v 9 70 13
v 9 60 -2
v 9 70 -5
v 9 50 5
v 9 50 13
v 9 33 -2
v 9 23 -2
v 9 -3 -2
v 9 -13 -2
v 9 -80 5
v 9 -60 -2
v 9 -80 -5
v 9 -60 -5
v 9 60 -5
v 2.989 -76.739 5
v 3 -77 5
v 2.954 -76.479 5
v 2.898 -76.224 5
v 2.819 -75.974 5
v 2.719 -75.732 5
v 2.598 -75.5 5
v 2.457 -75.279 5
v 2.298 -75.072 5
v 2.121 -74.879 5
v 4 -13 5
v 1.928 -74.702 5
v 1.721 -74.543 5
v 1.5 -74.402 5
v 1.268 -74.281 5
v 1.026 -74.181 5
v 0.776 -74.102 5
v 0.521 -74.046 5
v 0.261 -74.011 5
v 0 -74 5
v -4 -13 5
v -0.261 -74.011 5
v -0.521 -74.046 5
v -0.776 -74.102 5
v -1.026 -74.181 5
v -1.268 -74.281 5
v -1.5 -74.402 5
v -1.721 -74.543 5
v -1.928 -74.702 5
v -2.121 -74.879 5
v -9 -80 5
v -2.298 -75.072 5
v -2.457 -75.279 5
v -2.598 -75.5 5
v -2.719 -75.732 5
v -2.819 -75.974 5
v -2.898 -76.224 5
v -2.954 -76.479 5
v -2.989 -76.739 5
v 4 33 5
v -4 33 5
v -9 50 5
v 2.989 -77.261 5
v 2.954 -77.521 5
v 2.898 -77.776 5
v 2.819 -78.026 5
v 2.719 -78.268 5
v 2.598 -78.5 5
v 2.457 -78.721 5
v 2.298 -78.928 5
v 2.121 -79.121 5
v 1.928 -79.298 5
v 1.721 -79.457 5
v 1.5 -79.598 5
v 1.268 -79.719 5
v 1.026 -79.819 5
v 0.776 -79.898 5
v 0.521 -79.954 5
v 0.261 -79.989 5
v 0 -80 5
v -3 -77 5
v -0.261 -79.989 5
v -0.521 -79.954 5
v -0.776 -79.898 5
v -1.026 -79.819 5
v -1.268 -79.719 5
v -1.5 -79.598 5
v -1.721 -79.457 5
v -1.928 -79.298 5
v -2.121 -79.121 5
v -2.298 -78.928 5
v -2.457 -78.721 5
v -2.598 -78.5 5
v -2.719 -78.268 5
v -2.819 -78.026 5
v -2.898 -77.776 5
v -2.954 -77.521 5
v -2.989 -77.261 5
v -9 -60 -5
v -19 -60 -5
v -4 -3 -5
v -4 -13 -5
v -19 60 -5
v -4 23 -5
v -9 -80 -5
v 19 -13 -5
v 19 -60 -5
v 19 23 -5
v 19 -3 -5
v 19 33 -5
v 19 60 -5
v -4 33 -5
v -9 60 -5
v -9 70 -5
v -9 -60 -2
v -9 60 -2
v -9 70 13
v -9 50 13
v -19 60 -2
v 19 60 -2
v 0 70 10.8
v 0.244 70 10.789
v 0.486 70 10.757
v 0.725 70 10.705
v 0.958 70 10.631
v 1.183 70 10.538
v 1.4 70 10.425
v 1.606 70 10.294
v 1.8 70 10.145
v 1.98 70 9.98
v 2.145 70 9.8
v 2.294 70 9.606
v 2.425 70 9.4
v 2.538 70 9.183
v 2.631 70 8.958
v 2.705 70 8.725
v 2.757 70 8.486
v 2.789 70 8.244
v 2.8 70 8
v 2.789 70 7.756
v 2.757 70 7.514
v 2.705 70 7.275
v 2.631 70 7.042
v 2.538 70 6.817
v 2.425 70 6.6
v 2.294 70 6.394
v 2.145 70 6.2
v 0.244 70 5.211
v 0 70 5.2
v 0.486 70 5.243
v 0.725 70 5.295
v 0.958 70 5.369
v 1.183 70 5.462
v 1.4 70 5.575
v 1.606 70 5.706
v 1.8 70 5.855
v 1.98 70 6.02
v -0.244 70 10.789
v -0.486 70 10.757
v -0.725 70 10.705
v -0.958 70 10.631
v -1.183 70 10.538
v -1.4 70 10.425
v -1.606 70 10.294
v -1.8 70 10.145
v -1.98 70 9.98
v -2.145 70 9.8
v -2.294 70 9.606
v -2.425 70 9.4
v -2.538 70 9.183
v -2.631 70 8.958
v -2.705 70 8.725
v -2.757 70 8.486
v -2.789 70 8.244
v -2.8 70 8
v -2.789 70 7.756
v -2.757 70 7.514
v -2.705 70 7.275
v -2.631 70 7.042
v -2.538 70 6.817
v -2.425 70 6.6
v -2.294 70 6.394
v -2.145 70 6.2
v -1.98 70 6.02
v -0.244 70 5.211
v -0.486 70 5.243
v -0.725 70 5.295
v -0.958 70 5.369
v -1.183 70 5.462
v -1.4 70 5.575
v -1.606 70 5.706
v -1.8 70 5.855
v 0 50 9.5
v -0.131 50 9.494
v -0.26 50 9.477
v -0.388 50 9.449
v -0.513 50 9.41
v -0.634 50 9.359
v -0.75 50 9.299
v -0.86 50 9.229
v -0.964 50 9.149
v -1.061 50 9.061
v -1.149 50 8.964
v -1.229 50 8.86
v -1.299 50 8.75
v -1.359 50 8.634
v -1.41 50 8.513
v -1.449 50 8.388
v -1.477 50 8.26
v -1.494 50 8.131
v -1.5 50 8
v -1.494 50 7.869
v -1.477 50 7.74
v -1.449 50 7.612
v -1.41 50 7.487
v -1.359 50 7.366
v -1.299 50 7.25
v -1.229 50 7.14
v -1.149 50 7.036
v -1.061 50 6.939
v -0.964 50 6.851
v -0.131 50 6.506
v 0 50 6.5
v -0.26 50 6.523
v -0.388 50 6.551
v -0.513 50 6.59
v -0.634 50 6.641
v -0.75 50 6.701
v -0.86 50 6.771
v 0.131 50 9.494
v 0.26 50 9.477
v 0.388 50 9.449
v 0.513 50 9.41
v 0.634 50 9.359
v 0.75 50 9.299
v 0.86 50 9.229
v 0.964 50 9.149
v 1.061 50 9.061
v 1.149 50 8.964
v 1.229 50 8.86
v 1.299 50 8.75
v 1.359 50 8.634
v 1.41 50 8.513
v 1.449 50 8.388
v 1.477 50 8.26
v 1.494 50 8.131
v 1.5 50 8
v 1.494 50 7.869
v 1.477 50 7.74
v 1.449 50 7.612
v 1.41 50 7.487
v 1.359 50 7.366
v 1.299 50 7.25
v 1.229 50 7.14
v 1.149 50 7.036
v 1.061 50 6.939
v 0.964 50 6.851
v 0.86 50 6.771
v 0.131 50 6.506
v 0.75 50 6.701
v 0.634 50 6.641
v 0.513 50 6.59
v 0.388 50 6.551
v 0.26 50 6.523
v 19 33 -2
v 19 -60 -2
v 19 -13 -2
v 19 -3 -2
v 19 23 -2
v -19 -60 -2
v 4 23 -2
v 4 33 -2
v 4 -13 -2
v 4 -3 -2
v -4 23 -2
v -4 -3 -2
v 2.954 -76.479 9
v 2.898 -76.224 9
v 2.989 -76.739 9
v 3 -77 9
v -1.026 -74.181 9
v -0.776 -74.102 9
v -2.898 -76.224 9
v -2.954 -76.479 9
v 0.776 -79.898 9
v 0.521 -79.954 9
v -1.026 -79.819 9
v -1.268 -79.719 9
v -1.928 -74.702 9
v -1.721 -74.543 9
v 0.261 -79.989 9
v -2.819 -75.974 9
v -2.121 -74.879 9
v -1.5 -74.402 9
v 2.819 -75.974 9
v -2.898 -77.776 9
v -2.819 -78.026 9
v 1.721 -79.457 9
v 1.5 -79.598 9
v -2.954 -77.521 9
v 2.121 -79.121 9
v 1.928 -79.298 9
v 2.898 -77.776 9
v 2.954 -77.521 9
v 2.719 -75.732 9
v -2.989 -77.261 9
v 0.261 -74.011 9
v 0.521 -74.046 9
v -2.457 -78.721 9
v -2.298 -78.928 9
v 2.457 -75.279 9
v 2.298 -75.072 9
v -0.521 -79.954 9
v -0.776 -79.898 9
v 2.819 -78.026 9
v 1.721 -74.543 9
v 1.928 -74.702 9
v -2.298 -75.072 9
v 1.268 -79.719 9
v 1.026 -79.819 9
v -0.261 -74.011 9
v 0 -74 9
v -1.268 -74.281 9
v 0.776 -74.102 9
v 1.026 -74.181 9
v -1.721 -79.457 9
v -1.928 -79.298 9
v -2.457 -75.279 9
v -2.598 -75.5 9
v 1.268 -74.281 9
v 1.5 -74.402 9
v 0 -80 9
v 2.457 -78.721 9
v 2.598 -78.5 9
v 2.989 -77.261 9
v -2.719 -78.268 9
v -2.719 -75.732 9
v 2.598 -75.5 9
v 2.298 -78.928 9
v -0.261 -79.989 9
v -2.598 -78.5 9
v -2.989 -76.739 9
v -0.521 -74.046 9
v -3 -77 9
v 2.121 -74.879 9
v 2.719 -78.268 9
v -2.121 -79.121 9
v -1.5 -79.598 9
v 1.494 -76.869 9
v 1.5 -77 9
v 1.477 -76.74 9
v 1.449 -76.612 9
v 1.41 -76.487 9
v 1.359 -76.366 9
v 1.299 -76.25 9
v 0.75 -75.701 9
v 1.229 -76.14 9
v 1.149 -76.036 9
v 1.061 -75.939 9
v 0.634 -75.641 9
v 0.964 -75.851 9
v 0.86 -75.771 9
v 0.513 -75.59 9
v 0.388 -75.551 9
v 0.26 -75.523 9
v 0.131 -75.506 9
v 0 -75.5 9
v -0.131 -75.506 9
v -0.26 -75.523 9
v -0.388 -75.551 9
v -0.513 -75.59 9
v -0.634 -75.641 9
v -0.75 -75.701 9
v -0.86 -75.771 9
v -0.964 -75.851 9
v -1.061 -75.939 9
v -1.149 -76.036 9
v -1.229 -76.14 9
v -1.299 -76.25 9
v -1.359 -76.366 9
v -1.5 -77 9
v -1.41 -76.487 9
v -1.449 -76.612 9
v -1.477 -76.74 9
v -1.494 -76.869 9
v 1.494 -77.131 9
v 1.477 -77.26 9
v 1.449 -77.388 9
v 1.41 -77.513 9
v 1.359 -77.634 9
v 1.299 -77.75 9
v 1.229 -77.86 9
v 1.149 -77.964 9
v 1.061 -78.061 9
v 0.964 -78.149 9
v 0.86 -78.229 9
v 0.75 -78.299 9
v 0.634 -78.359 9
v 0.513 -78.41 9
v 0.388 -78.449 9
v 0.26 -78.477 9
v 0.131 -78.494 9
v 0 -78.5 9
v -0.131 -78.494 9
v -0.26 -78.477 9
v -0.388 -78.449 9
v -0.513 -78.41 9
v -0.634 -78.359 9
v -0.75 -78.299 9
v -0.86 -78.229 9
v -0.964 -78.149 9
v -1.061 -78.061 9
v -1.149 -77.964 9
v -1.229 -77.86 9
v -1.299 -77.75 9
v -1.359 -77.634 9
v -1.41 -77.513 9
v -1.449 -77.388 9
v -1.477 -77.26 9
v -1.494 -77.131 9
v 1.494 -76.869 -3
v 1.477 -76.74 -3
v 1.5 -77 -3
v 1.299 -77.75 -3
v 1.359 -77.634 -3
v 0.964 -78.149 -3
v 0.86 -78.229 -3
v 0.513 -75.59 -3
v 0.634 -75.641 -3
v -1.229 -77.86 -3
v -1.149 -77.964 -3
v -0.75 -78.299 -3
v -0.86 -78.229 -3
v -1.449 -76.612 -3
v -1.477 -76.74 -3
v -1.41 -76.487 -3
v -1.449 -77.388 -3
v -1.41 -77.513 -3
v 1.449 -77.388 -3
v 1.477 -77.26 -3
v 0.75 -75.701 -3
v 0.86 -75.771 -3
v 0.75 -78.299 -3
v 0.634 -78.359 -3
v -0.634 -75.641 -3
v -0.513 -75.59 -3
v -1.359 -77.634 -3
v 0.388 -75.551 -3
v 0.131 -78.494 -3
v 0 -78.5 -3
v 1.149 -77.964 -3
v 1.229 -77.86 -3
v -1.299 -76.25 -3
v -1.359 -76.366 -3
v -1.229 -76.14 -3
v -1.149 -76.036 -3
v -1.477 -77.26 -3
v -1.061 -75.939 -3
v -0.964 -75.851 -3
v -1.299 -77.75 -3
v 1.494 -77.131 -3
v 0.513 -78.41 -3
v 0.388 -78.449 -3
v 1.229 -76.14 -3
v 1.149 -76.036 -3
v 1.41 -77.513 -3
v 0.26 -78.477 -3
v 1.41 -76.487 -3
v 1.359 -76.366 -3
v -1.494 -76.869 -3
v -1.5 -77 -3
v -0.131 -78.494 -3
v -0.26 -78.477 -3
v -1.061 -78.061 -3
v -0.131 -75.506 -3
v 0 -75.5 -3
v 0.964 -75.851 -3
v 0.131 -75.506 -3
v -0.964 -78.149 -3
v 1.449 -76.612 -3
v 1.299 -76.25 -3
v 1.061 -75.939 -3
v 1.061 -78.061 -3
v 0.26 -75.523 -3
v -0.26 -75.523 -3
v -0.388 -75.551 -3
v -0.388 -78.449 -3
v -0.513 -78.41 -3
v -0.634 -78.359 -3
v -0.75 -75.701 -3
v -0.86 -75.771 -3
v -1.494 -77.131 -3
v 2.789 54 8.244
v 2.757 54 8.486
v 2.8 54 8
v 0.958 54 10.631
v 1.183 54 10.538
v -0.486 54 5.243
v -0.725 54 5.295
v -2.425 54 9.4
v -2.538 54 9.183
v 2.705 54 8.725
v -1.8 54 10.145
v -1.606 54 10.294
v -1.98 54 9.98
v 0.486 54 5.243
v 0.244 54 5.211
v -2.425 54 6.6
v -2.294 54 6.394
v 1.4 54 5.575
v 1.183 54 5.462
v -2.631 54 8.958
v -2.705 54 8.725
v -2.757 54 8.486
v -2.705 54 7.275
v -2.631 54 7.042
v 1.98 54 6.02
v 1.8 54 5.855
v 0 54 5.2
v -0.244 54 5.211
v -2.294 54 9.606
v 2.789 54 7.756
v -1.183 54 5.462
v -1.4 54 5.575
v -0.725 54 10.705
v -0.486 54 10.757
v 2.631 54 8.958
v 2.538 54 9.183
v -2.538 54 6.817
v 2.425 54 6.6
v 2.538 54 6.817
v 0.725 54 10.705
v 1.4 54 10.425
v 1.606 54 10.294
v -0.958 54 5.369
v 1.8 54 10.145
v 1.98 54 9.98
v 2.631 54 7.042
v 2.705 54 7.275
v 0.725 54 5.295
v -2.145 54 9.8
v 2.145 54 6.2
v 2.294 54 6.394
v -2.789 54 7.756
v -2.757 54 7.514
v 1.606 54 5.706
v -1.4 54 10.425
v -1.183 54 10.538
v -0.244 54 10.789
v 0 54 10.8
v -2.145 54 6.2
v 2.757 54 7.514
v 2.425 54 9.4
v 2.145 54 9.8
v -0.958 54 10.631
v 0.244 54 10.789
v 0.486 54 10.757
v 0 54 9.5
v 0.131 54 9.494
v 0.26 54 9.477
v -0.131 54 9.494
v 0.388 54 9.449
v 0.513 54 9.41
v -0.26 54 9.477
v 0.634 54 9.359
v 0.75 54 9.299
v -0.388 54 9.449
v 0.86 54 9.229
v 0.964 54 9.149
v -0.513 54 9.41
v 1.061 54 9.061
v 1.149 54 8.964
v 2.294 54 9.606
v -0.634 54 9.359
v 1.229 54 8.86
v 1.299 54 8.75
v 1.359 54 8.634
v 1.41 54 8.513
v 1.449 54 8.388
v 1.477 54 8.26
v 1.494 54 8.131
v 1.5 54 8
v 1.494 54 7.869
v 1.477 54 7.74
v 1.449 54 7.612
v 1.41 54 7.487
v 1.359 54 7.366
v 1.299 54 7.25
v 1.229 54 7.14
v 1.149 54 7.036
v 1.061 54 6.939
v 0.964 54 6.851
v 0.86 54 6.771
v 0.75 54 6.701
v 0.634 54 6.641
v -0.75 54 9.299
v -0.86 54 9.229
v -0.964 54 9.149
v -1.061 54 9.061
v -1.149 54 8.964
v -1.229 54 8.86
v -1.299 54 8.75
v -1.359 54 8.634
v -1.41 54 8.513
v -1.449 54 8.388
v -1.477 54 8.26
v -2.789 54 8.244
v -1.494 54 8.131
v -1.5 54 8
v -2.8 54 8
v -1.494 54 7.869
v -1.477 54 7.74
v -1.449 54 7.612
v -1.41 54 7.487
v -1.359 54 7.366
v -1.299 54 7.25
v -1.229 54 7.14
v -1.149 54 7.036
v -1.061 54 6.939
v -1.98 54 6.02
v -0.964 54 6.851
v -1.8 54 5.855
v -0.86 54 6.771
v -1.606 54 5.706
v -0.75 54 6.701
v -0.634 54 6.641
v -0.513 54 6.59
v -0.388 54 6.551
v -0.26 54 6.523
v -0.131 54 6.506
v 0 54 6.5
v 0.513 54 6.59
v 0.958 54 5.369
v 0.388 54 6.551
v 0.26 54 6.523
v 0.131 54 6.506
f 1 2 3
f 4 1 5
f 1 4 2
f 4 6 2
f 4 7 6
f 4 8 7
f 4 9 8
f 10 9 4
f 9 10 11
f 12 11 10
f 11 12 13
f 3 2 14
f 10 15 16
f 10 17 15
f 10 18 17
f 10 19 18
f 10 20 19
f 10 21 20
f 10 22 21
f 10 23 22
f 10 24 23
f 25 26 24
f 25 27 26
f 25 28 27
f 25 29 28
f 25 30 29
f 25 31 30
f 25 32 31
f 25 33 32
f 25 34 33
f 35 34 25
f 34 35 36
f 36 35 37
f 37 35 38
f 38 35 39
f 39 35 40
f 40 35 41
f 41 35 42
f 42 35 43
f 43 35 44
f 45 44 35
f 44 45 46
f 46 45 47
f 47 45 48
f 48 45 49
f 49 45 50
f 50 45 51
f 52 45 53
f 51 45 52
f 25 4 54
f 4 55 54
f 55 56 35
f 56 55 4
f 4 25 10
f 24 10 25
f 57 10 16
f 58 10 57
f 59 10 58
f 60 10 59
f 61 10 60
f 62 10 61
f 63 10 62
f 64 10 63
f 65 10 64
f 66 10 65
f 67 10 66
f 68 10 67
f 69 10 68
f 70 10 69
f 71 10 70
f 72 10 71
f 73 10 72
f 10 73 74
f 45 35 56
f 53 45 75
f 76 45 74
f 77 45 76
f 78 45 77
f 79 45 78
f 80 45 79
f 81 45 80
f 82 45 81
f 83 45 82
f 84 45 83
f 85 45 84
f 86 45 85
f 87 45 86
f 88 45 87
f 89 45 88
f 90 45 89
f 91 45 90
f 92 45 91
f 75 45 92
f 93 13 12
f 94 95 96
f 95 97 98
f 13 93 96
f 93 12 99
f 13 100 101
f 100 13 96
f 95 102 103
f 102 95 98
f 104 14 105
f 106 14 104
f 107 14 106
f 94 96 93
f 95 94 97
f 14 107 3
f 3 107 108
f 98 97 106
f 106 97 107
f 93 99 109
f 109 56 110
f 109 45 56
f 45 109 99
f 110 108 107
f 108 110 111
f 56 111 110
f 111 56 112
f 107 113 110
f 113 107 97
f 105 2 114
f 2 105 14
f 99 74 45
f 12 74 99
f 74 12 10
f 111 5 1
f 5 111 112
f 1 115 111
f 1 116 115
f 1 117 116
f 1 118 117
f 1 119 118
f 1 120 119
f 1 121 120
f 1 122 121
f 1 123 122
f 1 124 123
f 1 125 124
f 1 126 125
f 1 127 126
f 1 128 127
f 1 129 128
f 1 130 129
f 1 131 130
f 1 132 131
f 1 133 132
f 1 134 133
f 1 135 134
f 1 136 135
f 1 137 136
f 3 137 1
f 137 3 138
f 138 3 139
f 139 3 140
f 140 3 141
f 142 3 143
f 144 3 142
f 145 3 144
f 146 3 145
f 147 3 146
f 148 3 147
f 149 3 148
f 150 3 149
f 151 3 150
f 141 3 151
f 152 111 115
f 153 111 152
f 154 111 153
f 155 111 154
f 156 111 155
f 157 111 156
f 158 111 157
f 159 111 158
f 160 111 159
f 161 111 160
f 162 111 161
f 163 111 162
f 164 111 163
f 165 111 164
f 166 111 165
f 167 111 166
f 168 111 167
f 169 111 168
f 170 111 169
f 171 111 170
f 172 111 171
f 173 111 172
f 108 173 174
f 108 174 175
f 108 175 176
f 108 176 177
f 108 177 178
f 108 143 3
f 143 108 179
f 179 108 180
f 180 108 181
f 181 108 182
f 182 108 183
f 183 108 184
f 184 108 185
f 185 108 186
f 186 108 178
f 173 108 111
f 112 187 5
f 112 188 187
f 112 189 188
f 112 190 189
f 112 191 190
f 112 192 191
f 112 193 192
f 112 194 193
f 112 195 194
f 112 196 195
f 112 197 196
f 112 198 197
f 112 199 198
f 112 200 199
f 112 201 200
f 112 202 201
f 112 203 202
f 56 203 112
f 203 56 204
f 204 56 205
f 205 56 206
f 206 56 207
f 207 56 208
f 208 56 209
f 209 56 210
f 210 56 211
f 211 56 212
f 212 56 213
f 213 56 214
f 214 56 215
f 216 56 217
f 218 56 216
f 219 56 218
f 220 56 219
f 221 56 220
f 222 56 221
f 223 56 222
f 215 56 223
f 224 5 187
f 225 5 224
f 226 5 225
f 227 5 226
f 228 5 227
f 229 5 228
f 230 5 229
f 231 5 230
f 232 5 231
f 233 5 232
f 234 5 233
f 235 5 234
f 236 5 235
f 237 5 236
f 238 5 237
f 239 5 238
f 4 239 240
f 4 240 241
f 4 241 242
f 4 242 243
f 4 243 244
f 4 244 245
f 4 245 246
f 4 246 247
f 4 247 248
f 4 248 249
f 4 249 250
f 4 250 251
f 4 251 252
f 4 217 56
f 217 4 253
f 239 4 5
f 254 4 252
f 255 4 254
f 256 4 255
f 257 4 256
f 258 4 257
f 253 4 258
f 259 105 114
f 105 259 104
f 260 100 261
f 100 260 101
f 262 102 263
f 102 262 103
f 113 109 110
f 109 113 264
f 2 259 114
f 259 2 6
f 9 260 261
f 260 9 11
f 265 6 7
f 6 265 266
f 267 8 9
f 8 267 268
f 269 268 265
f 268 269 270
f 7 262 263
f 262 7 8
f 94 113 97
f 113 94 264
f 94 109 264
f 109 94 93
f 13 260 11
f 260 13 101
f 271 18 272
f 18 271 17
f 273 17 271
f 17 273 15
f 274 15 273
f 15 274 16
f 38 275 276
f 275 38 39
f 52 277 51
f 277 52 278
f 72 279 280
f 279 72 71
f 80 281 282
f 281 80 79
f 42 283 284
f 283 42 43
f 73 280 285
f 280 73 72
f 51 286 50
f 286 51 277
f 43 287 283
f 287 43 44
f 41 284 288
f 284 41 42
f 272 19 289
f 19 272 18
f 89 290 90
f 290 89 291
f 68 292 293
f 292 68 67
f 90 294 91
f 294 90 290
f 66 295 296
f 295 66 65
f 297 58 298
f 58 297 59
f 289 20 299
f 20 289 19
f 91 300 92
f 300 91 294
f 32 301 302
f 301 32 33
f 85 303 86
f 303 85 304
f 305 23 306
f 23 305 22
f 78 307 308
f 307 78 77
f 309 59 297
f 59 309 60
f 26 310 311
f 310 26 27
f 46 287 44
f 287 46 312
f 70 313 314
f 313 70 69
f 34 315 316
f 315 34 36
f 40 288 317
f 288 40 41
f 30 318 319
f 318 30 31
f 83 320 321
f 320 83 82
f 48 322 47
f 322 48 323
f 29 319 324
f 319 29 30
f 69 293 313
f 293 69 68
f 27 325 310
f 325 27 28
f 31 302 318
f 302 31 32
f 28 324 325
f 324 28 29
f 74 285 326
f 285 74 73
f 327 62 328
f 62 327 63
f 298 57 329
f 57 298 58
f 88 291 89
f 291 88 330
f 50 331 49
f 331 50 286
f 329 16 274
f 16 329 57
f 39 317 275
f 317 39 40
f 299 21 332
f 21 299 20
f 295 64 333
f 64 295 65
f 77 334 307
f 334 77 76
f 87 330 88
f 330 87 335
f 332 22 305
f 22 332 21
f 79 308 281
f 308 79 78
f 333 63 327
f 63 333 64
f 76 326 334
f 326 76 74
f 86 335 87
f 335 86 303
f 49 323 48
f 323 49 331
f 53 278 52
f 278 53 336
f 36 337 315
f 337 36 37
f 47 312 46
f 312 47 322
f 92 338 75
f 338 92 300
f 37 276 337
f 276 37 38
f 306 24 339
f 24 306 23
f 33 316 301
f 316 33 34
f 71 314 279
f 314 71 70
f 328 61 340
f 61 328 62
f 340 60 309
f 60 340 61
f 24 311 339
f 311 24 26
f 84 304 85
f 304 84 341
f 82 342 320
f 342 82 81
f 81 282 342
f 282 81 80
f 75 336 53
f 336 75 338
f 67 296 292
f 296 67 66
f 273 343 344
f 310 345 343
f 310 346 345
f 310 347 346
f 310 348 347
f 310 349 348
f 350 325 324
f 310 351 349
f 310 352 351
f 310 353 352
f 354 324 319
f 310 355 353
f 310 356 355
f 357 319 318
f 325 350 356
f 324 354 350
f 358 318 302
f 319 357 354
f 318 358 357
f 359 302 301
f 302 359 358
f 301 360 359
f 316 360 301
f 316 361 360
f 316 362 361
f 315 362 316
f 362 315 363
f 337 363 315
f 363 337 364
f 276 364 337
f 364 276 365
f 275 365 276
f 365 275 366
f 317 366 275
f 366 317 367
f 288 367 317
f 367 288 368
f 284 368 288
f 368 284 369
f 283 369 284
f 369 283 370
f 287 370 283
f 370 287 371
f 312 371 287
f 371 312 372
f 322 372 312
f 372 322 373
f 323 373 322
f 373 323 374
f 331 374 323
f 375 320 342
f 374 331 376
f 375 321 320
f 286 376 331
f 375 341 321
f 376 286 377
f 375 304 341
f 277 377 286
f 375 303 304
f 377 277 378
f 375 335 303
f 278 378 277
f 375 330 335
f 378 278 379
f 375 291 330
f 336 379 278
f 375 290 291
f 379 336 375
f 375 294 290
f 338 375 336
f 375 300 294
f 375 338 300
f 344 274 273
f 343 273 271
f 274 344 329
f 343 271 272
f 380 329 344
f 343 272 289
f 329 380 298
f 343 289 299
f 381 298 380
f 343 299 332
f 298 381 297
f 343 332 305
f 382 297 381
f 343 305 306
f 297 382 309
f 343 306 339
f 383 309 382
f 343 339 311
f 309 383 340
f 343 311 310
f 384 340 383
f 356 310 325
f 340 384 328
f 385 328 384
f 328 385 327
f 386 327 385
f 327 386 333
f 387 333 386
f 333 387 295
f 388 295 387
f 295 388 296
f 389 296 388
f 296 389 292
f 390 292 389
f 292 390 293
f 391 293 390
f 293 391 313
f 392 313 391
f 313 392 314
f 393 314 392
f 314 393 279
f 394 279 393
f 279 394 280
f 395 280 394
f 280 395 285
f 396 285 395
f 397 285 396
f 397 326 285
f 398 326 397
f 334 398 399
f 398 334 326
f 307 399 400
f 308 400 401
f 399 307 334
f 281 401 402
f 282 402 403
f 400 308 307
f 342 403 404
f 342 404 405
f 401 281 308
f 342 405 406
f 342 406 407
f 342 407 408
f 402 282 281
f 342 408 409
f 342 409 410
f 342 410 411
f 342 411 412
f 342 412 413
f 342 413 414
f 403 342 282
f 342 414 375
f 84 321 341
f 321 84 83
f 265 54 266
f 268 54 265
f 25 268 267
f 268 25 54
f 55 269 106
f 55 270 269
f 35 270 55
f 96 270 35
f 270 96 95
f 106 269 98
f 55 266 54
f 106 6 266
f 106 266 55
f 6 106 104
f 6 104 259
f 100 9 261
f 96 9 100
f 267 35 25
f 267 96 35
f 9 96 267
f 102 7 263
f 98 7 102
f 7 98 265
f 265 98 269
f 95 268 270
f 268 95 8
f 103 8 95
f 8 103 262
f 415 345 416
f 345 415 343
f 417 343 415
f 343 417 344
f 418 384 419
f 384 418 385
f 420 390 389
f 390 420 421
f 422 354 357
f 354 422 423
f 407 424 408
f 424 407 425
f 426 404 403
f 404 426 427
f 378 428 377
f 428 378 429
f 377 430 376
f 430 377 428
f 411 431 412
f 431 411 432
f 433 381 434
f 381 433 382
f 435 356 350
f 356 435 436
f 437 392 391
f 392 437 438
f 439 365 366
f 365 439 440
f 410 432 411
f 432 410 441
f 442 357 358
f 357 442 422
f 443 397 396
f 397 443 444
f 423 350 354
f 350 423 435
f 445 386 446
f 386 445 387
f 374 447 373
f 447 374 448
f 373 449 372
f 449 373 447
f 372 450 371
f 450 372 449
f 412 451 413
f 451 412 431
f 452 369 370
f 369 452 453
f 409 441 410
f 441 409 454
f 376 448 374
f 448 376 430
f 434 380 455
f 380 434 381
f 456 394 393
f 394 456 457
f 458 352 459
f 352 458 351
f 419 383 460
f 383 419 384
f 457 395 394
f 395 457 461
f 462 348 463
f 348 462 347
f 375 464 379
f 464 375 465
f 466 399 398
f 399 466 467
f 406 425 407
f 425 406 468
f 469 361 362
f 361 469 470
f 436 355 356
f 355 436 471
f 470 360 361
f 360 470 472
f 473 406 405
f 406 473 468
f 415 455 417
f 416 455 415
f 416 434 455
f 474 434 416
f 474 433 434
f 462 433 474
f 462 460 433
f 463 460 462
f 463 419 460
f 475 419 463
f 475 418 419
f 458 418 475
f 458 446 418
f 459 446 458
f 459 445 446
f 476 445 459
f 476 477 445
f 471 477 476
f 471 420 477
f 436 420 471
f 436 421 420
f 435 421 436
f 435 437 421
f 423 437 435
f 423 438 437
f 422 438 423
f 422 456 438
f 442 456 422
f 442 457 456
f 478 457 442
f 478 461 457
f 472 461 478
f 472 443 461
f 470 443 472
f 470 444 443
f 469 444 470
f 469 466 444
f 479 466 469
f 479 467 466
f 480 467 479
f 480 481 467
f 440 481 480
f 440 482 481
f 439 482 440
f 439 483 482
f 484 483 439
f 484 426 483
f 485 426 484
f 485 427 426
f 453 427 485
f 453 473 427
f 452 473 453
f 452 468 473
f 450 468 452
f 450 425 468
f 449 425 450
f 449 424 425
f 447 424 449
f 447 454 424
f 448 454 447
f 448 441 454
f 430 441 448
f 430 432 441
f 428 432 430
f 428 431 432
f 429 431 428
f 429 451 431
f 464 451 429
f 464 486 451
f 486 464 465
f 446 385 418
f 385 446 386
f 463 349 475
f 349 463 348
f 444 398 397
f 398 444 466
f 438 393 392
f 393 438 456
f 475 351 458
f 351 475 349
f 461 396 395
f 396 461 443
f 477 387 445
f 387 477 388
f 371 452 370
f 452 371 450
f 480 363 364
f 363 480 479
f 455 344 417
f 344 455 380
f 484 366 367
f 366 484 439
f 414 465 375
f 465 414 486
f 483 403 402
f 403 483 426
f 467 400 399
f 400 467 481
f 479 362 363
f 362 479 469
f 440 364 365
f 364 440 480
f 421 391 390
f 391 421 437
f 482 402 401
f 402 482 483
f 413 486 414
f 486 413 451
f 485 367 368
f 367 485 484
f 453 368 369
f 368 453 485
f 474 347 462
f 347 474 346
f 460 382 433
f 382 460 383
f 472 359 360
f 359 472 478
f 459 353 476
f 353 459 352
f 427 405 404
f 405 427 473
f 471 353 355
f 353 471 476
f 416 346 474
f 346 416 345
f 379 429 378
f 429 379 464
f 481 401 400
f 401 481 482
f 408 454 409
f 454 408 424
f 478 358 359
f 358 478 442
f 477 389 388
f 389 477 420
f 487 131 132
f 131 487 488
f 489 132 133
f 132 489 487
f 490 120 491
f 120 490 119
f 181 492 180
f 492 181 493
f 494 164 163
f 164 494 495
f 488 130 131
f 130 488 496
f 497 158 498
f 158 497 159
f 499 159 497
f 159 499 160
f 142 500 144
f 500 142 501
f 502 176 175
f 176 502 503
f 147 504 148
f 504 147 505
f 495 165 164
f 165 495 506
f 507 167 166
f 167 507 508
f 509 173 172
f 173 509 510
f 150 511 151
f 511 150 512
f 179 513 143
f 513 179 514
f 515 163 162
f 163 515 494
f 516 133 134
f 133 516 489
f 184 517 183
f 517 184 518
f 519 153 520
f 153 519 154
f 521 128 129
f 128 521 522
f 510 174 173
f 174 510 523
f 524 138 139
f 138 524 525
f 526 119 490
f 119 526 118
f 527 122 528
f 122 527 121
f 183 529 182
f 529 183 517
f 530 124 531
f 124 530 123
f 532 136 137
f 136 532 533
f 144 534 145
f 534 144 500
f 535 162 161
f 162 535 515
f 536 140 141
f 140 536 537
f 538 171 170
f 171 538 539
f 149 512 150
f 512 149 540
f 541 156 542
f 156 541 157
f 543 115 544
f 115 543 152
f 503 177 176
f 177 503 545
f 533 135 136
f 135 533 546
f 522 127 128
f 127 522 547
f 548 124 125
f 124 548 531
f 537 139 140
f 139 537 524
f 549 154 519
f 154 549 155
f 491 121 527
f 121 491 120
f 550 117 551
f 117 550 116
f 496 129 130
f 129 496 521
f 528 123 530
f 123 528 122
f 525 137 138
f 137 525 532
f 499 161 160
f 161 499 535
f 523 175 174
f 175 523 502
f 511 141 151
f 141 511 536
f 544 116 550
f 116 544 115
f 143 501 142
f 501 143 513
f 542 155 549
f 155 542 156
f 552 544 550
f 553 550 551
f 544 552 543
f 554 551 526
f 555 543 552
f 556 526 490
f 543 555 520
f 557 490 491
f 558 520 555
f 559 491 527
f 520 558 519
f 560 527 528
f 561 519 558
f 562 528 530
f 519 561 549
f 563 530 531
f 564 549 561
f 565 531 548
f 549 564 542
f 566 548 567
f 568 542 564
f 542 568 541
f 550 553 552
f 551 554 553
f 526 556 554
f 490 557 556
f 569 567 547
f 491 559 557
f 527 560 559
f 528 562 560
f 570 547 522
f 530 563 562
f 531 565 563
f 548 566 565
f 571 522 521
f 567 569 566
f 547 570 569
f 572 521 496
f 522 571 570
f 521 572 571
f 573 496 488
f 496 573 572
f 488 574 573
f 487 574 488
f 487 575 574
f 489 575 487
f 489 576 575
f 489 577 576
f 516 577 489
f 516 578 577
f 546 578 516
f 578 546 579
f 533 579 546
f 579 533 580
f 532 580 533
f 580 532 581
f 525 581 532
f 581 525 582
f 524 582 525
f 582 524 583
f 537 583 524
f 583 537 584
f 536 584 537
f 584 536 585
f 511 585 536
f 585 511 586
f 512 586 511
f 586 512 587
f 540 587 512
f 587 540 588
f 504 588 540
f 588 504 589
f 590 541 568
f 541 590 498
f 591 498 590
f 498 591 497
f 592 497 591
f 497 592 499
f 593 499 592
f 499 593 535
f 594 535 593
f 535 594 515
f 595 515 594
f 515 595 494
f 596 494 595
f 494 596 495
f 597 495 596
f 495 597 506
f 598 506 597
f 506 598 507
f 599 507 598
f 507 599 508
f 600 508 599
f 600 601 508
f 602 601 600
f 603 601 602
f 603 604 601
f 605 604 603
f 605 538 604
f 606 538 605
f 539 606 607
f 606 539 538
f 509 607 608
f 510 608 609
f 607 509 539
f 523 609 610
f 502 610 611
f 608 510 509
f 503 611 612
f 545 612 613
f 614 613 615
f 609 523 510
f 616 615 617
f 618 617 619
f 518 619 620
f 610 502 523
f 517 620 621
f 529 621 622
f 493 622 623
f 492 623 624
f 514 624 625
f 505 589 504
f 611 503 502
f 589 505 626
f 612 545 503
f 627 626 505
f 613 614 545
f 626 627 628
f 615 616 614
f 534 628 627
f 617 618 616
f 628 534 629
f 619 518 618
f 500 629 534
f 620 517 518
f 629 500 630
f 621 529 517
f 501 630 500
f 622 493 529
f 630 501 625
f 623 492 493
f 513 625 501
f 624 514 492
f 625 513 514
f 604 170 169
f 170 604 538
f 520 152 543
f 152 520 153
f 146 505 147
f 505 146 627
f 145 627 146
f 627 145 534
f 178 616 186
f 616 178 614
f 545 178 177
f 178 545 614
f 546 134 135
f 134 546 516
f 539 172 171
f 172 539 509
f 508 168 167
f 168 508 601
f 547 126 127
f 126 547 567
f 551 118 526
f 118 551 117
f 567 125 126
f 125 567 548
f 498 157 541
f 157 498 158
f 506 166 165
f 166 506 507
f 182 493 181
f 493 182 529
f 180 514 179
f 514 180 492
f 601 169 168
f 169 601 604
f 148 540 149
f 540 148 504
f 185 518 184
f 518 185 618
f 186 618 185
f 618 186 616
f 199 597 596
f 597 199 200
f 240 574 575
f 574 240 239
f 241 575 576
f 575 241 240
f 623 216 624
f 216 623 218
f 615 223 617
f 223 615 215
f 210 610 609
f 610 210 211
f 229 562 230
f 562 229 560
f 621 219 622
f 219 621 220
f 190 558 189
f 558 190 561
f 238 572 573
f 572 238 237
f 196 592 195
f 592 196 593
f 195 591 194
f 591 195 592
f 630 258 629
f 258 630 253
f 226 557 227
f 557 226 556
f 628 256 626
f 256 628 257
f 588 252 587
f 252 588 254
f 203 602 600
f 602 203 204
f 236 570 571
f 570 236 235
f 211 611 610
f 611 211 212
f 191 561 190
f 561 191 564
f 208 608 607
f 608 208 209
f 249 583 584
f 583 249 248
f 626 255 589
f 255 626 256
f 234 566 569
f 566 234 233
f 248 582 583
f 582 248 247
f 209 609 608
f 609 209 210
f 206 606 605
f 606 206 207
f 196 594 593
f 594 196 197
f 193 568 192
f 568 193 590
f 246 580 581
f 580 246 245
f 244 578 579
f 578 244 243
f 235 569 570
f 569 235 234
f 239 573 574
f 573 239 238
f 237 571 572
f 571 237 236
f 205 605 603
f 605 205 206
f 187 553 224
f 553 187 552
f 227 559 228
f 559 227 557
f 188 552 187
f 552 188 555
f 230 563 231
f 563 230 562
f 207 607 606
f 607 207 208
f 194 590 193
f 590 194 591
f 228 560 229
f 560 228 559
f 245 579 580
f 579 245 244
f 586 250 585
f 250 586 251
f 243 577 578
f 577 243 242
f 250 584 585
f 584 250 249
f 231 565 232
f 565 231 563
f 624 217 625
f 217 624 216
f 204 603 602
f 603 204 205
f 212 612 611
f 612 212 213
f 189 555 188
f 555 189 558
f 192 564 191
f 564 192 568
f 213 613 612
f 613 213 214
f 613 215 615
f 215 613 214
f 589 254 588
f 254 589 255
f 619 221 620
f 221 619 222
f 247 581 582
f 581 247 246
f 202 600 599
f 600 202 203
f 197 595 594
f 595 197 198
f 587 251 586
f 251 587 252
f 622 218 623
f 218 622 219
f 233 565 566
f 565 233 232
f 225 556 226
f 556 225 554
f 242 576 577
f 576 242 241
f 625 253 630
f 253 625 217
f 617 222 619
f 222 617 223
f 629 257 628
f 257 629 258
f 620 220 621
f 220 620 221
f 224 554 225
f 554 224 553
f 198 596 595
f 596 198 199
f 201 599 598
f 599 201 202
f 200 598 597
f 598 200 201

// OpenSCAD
// SPDX-License-Identifier: CC-BY-SA-4.0
//
//Housing for cable-actuated slide potentiometer
//
//Copyright (C) 2018 Peter Bennett <thelargeostrich@gmail.com>
//
//This design is licensed under a Creative Commons Attribution-ShareAlike
//4.0 International license.
//
//You are free to:
//  Share — copy and redistribute the material in any medium or format
//  Adapt — remix, transform, and build upon the material
//          for any purpose, even commercially.
//
//Under the following terms:
//
//  Attribution — You must give appropriate credit, provide a link to
//                the license, and indicate if changes were made. You
//                may do so in any reasonable manner, but not in any
//                way that suggests the licensor endorses you or your use.
//  ShareAlike  — If you remix, transform, or build upon the material,
//                you must distribute your contributions under the same
//                license as the original.
//  No additional restrictions — You may not apply legal terms or
//                technological measures that legally restrict others
//                from doing anything the license permits.

$fn=72;
module throttlecontrol(){
    difference(){
        union(){
            translate([0,-10,0])
                cube([18,140,10],center=true);
            translate([0,60,4])
                cube([18,20,18],center=true);
            translate([0,0,-3.5])
                cube([38,120,3],center=true);
            translate([0,-77,4])
                cylinder(r=3,h=10,center=true);
        };
        translate([0,10,2])
            cube([8,46,8],center=true);
        translate([10,28,-6])
            cube([28,10,8],center=true);
        translate([10,-8,-6])
            cube([28,10,8],center=true);
        translate([0,-77,8])
            cylinder(r=1.5,h=22,center=true);
        translate([0,65,8])
            rotate([90,0,0])
                cylinder(r=2.8,h=22,center=true);
        translate([0,55,8])
            rotate([90,0,0])
                cylinder(r=1.5,h=22,center=true);
    };
}
throttlecontrol();
